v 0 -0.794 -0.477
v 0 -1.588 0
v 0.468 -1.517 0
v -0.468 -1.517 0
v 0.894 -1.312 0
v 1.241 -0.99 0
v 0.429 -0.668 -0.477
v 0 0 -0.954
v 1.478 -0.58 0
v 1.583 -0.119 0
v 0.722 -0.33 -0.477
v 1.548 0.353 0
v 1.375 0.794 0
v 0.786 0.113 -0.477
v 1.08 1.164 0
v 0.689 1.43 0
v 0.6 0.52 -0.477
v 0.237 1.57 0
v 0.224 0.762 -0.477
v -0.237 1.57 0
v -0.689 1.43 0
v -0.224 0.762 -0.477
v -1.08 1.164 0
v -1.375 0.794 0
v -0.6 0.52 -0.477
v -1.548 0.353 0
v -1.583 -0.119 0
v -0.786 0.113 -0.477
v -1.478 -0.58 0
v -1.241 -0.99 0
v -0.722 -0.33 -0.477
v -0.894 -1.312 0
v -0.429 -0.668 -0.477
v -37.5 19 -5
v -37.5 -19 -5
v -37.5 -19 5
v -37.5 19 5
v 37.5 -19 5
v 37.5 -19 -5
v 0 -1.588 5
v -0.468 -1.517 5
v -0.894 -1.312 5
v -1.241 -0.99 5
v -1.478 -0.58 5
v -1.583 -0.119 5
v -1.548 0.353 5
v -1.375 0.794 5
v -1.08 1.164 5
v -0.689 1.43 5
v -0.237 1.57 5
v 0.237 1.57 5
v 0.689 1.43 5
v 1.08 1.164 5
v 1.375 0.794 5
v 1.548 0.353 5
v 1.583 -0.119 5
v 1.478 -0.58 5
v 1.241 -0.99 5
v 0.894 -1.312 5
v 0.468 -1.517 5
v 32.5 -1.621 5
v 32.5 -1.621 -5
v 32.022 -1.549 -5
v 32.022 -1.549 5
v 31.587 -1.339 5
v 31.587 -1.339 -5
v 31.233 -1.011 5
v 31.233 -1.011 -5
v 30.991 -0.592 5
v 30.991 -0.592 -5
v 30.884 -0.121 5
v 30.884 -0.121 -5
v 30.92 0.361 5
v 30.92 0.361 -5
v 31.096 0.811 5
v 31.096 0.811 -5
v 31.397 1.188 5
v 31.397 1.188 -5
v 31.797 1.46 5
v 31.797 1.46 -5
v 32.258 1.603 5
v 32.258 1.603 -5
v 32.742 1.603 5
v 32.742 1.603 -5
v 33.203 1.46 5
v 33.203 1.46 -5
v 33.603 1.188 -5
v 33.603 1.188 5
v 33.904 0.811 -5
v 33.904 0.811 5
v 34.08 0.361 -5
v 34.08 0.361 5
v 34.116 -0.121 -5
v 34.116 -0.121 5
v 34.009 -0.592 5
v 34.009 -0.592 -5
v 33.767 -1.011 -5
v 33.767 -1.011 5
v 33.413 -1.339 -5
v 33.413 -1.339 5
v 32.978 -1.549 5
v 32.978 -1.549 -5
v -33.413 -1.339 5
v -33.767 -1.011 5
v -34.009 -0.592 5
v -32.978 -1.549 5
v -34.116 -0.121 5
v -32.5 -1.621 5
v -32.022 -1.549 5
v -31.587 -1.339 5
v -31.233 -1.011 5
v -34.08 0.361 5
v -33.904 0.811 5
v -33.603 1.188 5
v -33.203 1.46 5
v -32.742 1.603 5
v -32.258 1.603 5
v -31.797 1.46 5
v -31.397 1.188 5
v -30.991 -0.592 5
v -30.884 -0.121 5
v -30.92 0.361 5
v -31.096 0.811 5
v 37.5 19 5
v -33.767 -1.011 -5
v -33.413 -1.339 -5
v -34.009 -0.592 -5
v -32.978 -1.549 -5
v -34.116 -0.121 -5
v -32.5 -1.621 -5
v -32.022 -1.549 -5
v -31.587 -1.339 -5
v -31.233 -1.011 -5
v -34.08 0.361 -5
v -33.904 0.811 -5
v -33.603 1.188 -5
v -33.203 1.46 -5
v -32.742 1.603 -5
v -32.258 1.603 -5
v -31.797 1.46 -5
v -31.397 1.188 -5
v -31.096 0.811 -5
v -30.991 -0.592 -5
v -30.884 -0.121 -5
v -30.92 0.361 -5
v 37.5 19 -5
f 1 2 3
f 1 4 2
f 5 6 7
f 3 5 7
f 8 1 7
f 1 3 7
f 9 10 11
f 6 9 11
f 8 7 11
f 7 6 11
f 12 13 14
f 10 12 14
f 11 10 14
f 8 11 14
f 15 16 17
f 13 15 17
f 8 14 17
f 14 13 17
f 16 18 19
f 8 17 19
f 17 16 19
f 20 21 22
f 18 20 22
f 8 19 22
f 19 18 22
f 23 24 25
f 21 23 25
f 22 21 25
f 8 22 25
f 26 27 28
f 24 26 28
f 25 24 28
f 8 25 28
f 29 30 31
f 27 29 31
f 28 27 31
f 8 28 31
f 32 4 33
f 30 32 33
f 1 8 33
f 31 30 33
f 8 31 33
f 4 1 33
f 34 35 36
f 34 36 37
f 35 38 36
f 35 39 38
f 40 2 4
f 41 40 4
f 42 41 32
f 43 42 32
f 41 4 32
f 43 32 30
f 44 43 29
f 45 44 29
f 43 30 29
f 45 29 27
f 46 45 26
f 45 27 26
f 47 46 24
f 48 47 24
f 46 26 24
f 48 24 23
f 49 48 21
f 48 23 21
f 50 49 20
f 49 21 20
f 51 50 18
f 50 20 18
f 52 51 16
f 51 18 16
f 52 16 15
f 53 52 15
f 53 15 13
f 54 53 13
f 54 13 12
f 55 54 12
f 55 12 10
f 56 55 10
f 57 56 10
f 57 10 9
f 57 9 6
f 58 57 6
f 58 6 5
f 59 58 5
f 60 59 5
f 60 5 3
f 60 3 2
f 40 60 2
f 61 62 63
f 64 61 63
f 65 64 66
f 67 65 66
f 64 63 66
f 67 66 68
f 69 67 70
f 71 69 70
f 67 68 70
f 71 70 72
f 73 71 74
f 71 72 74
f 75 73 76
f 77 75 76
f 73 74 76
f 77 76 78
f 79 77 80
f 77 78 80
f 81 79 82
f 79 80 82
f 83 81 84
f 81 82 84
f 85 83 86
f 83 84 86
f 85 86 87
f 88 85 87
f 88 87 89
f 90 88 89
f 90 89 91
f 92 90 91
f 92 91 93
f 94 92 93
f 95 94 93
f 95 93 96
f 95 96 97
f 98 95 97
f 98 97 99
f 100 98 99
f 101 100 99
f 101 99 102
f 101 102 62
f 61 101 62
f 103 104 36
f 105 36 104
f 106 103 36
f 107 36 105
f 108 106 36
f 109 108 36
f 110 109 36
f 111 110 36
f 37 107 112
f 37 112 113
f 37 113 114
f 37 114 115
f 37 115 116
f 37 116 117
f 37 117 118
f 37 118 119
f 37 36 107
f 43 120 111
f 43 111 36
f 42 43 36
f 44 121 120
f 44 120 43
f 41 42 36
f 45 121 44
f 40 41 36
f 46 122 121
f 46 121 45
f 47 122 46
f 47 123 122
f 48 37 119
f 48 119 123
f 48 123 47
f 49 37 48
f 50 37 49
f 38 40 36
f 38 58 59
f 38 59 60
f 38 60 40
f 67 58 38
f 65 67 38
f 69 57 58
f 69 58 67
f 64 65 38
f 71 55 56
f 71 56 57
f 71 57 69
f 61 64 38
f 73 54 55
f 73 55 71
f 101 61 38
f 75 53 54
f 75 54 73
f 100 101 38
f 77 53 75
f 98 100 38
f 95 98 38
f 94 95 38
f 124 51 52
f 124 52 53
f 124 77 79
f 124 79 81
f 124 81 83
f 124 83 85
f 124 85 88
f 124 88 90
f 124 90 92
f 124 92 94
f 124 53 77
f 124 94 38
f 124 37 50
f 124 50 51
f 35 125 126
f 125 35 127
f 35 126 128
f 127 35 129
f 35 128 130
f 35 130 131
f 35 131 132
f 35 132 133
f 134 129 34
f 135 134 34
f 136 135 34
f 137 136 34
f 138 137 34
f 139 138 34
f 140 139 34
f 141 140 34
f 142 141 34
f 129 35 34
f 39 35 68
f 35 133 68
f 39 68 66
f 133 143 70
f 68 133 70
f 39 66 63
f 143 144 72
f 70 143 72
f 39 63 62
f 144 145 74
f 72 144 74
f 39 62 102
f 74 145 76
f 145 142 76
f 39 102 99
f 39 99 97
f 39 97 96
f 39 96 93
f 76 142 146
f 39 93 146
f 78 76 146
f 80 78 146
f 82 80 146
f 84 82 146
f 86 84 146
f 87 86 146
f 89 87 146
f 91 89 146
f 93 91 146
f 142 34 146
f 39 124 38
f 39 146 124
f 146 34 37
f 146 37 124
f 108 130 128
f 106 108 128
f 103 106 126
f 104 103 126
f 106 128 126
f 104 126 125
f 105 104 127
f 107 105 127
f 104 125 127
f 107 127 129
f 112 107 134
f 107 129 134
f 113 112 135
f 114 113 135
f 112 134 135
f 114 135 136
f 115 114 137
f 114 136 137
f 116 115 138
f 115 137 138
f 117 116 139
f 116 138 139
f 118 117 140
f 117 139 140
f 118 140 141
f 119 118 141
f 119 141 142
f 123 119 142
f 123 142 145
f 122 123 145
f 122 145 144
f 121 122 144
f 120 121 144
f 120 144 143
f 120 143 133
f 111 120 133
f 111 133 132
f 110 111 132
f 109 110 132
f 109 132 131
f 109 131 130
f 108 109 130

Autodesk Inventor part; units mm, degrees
ref_plane "YZ Plane" through (0, 0, 0) normal (1, 0, 0) x (0, 1, 0)
ref_plane "XZ Plane" through (0, 0, 0) normal (0, 1, 0) x (-1, 0, 0)
ref_plane "XY Plane" through (0, 0, 0) normal (0, 0, 1) x (1, 0, 0)
sketch "Sketch1" plane through (0, 0, 0) normal (0, 0, 1) x (1, 0, 0)
  line L0 (-37.5, 19) -> (37.5, 19)
  line L1 (37.5, 19) -> (37.5, -19)
  line L2 (37.5, -19) -> (-37.5, -19)
  line L3 (-37.5, -19) -> (-37.5, 19)
  line L4 (-37.5, 19) -> (37.5, -19) construction
  line L5 (37.5, 19) -> (-37.5, -19) construction
  point P0 (0, 0)
  dimension "d2" = 38
  dimension "d3" = 75
extrude "Extrusion1" add sketch "Sketch1" along normal mid plane 10
sketch "Sketch3" plane through (0, 0, 5) normal (0, 0, 1) x (1, 0, 0)
  point P0 (0, 0)
  point P1 (0, 0)
hole "Hole2" at (0, 0, 5) direction (0, 0, -1) diameter 3.175 depth 5 tip angle 118
sketch "Sketch4" plane through (0, 0, 5) normal (0, 0, 1) x (1, 0, 0)
  line L0 (-37.5, 19) -> (-37.5, -19) projected
  circle A0 centre (0, 0) radius 1.5875 projected
  line L1 (-37.5, -19) -> (37.5, -19) projected
  line L2 (37.5, -19) -> (37.5, 19) projected
  line L3 (37.5, 19) -> (-37.5, 19) projected
  line L4 (-37.5, 19) -> (-37.5, -19) projected
  point P0 (-32.5, 0)
  point P1 (32.5, 0)
  dimension "d76" = 5
  dimension "d79" = 65
hole "Hole3" at (-32.5, 0, 5) at (32.5, 0, 5) direction (0, 0, -1) diameter 3.242 end through all thread size "M4x0.7" class "6H" standard "ANSI Metric M Profile"
properties part number "baseblock"
